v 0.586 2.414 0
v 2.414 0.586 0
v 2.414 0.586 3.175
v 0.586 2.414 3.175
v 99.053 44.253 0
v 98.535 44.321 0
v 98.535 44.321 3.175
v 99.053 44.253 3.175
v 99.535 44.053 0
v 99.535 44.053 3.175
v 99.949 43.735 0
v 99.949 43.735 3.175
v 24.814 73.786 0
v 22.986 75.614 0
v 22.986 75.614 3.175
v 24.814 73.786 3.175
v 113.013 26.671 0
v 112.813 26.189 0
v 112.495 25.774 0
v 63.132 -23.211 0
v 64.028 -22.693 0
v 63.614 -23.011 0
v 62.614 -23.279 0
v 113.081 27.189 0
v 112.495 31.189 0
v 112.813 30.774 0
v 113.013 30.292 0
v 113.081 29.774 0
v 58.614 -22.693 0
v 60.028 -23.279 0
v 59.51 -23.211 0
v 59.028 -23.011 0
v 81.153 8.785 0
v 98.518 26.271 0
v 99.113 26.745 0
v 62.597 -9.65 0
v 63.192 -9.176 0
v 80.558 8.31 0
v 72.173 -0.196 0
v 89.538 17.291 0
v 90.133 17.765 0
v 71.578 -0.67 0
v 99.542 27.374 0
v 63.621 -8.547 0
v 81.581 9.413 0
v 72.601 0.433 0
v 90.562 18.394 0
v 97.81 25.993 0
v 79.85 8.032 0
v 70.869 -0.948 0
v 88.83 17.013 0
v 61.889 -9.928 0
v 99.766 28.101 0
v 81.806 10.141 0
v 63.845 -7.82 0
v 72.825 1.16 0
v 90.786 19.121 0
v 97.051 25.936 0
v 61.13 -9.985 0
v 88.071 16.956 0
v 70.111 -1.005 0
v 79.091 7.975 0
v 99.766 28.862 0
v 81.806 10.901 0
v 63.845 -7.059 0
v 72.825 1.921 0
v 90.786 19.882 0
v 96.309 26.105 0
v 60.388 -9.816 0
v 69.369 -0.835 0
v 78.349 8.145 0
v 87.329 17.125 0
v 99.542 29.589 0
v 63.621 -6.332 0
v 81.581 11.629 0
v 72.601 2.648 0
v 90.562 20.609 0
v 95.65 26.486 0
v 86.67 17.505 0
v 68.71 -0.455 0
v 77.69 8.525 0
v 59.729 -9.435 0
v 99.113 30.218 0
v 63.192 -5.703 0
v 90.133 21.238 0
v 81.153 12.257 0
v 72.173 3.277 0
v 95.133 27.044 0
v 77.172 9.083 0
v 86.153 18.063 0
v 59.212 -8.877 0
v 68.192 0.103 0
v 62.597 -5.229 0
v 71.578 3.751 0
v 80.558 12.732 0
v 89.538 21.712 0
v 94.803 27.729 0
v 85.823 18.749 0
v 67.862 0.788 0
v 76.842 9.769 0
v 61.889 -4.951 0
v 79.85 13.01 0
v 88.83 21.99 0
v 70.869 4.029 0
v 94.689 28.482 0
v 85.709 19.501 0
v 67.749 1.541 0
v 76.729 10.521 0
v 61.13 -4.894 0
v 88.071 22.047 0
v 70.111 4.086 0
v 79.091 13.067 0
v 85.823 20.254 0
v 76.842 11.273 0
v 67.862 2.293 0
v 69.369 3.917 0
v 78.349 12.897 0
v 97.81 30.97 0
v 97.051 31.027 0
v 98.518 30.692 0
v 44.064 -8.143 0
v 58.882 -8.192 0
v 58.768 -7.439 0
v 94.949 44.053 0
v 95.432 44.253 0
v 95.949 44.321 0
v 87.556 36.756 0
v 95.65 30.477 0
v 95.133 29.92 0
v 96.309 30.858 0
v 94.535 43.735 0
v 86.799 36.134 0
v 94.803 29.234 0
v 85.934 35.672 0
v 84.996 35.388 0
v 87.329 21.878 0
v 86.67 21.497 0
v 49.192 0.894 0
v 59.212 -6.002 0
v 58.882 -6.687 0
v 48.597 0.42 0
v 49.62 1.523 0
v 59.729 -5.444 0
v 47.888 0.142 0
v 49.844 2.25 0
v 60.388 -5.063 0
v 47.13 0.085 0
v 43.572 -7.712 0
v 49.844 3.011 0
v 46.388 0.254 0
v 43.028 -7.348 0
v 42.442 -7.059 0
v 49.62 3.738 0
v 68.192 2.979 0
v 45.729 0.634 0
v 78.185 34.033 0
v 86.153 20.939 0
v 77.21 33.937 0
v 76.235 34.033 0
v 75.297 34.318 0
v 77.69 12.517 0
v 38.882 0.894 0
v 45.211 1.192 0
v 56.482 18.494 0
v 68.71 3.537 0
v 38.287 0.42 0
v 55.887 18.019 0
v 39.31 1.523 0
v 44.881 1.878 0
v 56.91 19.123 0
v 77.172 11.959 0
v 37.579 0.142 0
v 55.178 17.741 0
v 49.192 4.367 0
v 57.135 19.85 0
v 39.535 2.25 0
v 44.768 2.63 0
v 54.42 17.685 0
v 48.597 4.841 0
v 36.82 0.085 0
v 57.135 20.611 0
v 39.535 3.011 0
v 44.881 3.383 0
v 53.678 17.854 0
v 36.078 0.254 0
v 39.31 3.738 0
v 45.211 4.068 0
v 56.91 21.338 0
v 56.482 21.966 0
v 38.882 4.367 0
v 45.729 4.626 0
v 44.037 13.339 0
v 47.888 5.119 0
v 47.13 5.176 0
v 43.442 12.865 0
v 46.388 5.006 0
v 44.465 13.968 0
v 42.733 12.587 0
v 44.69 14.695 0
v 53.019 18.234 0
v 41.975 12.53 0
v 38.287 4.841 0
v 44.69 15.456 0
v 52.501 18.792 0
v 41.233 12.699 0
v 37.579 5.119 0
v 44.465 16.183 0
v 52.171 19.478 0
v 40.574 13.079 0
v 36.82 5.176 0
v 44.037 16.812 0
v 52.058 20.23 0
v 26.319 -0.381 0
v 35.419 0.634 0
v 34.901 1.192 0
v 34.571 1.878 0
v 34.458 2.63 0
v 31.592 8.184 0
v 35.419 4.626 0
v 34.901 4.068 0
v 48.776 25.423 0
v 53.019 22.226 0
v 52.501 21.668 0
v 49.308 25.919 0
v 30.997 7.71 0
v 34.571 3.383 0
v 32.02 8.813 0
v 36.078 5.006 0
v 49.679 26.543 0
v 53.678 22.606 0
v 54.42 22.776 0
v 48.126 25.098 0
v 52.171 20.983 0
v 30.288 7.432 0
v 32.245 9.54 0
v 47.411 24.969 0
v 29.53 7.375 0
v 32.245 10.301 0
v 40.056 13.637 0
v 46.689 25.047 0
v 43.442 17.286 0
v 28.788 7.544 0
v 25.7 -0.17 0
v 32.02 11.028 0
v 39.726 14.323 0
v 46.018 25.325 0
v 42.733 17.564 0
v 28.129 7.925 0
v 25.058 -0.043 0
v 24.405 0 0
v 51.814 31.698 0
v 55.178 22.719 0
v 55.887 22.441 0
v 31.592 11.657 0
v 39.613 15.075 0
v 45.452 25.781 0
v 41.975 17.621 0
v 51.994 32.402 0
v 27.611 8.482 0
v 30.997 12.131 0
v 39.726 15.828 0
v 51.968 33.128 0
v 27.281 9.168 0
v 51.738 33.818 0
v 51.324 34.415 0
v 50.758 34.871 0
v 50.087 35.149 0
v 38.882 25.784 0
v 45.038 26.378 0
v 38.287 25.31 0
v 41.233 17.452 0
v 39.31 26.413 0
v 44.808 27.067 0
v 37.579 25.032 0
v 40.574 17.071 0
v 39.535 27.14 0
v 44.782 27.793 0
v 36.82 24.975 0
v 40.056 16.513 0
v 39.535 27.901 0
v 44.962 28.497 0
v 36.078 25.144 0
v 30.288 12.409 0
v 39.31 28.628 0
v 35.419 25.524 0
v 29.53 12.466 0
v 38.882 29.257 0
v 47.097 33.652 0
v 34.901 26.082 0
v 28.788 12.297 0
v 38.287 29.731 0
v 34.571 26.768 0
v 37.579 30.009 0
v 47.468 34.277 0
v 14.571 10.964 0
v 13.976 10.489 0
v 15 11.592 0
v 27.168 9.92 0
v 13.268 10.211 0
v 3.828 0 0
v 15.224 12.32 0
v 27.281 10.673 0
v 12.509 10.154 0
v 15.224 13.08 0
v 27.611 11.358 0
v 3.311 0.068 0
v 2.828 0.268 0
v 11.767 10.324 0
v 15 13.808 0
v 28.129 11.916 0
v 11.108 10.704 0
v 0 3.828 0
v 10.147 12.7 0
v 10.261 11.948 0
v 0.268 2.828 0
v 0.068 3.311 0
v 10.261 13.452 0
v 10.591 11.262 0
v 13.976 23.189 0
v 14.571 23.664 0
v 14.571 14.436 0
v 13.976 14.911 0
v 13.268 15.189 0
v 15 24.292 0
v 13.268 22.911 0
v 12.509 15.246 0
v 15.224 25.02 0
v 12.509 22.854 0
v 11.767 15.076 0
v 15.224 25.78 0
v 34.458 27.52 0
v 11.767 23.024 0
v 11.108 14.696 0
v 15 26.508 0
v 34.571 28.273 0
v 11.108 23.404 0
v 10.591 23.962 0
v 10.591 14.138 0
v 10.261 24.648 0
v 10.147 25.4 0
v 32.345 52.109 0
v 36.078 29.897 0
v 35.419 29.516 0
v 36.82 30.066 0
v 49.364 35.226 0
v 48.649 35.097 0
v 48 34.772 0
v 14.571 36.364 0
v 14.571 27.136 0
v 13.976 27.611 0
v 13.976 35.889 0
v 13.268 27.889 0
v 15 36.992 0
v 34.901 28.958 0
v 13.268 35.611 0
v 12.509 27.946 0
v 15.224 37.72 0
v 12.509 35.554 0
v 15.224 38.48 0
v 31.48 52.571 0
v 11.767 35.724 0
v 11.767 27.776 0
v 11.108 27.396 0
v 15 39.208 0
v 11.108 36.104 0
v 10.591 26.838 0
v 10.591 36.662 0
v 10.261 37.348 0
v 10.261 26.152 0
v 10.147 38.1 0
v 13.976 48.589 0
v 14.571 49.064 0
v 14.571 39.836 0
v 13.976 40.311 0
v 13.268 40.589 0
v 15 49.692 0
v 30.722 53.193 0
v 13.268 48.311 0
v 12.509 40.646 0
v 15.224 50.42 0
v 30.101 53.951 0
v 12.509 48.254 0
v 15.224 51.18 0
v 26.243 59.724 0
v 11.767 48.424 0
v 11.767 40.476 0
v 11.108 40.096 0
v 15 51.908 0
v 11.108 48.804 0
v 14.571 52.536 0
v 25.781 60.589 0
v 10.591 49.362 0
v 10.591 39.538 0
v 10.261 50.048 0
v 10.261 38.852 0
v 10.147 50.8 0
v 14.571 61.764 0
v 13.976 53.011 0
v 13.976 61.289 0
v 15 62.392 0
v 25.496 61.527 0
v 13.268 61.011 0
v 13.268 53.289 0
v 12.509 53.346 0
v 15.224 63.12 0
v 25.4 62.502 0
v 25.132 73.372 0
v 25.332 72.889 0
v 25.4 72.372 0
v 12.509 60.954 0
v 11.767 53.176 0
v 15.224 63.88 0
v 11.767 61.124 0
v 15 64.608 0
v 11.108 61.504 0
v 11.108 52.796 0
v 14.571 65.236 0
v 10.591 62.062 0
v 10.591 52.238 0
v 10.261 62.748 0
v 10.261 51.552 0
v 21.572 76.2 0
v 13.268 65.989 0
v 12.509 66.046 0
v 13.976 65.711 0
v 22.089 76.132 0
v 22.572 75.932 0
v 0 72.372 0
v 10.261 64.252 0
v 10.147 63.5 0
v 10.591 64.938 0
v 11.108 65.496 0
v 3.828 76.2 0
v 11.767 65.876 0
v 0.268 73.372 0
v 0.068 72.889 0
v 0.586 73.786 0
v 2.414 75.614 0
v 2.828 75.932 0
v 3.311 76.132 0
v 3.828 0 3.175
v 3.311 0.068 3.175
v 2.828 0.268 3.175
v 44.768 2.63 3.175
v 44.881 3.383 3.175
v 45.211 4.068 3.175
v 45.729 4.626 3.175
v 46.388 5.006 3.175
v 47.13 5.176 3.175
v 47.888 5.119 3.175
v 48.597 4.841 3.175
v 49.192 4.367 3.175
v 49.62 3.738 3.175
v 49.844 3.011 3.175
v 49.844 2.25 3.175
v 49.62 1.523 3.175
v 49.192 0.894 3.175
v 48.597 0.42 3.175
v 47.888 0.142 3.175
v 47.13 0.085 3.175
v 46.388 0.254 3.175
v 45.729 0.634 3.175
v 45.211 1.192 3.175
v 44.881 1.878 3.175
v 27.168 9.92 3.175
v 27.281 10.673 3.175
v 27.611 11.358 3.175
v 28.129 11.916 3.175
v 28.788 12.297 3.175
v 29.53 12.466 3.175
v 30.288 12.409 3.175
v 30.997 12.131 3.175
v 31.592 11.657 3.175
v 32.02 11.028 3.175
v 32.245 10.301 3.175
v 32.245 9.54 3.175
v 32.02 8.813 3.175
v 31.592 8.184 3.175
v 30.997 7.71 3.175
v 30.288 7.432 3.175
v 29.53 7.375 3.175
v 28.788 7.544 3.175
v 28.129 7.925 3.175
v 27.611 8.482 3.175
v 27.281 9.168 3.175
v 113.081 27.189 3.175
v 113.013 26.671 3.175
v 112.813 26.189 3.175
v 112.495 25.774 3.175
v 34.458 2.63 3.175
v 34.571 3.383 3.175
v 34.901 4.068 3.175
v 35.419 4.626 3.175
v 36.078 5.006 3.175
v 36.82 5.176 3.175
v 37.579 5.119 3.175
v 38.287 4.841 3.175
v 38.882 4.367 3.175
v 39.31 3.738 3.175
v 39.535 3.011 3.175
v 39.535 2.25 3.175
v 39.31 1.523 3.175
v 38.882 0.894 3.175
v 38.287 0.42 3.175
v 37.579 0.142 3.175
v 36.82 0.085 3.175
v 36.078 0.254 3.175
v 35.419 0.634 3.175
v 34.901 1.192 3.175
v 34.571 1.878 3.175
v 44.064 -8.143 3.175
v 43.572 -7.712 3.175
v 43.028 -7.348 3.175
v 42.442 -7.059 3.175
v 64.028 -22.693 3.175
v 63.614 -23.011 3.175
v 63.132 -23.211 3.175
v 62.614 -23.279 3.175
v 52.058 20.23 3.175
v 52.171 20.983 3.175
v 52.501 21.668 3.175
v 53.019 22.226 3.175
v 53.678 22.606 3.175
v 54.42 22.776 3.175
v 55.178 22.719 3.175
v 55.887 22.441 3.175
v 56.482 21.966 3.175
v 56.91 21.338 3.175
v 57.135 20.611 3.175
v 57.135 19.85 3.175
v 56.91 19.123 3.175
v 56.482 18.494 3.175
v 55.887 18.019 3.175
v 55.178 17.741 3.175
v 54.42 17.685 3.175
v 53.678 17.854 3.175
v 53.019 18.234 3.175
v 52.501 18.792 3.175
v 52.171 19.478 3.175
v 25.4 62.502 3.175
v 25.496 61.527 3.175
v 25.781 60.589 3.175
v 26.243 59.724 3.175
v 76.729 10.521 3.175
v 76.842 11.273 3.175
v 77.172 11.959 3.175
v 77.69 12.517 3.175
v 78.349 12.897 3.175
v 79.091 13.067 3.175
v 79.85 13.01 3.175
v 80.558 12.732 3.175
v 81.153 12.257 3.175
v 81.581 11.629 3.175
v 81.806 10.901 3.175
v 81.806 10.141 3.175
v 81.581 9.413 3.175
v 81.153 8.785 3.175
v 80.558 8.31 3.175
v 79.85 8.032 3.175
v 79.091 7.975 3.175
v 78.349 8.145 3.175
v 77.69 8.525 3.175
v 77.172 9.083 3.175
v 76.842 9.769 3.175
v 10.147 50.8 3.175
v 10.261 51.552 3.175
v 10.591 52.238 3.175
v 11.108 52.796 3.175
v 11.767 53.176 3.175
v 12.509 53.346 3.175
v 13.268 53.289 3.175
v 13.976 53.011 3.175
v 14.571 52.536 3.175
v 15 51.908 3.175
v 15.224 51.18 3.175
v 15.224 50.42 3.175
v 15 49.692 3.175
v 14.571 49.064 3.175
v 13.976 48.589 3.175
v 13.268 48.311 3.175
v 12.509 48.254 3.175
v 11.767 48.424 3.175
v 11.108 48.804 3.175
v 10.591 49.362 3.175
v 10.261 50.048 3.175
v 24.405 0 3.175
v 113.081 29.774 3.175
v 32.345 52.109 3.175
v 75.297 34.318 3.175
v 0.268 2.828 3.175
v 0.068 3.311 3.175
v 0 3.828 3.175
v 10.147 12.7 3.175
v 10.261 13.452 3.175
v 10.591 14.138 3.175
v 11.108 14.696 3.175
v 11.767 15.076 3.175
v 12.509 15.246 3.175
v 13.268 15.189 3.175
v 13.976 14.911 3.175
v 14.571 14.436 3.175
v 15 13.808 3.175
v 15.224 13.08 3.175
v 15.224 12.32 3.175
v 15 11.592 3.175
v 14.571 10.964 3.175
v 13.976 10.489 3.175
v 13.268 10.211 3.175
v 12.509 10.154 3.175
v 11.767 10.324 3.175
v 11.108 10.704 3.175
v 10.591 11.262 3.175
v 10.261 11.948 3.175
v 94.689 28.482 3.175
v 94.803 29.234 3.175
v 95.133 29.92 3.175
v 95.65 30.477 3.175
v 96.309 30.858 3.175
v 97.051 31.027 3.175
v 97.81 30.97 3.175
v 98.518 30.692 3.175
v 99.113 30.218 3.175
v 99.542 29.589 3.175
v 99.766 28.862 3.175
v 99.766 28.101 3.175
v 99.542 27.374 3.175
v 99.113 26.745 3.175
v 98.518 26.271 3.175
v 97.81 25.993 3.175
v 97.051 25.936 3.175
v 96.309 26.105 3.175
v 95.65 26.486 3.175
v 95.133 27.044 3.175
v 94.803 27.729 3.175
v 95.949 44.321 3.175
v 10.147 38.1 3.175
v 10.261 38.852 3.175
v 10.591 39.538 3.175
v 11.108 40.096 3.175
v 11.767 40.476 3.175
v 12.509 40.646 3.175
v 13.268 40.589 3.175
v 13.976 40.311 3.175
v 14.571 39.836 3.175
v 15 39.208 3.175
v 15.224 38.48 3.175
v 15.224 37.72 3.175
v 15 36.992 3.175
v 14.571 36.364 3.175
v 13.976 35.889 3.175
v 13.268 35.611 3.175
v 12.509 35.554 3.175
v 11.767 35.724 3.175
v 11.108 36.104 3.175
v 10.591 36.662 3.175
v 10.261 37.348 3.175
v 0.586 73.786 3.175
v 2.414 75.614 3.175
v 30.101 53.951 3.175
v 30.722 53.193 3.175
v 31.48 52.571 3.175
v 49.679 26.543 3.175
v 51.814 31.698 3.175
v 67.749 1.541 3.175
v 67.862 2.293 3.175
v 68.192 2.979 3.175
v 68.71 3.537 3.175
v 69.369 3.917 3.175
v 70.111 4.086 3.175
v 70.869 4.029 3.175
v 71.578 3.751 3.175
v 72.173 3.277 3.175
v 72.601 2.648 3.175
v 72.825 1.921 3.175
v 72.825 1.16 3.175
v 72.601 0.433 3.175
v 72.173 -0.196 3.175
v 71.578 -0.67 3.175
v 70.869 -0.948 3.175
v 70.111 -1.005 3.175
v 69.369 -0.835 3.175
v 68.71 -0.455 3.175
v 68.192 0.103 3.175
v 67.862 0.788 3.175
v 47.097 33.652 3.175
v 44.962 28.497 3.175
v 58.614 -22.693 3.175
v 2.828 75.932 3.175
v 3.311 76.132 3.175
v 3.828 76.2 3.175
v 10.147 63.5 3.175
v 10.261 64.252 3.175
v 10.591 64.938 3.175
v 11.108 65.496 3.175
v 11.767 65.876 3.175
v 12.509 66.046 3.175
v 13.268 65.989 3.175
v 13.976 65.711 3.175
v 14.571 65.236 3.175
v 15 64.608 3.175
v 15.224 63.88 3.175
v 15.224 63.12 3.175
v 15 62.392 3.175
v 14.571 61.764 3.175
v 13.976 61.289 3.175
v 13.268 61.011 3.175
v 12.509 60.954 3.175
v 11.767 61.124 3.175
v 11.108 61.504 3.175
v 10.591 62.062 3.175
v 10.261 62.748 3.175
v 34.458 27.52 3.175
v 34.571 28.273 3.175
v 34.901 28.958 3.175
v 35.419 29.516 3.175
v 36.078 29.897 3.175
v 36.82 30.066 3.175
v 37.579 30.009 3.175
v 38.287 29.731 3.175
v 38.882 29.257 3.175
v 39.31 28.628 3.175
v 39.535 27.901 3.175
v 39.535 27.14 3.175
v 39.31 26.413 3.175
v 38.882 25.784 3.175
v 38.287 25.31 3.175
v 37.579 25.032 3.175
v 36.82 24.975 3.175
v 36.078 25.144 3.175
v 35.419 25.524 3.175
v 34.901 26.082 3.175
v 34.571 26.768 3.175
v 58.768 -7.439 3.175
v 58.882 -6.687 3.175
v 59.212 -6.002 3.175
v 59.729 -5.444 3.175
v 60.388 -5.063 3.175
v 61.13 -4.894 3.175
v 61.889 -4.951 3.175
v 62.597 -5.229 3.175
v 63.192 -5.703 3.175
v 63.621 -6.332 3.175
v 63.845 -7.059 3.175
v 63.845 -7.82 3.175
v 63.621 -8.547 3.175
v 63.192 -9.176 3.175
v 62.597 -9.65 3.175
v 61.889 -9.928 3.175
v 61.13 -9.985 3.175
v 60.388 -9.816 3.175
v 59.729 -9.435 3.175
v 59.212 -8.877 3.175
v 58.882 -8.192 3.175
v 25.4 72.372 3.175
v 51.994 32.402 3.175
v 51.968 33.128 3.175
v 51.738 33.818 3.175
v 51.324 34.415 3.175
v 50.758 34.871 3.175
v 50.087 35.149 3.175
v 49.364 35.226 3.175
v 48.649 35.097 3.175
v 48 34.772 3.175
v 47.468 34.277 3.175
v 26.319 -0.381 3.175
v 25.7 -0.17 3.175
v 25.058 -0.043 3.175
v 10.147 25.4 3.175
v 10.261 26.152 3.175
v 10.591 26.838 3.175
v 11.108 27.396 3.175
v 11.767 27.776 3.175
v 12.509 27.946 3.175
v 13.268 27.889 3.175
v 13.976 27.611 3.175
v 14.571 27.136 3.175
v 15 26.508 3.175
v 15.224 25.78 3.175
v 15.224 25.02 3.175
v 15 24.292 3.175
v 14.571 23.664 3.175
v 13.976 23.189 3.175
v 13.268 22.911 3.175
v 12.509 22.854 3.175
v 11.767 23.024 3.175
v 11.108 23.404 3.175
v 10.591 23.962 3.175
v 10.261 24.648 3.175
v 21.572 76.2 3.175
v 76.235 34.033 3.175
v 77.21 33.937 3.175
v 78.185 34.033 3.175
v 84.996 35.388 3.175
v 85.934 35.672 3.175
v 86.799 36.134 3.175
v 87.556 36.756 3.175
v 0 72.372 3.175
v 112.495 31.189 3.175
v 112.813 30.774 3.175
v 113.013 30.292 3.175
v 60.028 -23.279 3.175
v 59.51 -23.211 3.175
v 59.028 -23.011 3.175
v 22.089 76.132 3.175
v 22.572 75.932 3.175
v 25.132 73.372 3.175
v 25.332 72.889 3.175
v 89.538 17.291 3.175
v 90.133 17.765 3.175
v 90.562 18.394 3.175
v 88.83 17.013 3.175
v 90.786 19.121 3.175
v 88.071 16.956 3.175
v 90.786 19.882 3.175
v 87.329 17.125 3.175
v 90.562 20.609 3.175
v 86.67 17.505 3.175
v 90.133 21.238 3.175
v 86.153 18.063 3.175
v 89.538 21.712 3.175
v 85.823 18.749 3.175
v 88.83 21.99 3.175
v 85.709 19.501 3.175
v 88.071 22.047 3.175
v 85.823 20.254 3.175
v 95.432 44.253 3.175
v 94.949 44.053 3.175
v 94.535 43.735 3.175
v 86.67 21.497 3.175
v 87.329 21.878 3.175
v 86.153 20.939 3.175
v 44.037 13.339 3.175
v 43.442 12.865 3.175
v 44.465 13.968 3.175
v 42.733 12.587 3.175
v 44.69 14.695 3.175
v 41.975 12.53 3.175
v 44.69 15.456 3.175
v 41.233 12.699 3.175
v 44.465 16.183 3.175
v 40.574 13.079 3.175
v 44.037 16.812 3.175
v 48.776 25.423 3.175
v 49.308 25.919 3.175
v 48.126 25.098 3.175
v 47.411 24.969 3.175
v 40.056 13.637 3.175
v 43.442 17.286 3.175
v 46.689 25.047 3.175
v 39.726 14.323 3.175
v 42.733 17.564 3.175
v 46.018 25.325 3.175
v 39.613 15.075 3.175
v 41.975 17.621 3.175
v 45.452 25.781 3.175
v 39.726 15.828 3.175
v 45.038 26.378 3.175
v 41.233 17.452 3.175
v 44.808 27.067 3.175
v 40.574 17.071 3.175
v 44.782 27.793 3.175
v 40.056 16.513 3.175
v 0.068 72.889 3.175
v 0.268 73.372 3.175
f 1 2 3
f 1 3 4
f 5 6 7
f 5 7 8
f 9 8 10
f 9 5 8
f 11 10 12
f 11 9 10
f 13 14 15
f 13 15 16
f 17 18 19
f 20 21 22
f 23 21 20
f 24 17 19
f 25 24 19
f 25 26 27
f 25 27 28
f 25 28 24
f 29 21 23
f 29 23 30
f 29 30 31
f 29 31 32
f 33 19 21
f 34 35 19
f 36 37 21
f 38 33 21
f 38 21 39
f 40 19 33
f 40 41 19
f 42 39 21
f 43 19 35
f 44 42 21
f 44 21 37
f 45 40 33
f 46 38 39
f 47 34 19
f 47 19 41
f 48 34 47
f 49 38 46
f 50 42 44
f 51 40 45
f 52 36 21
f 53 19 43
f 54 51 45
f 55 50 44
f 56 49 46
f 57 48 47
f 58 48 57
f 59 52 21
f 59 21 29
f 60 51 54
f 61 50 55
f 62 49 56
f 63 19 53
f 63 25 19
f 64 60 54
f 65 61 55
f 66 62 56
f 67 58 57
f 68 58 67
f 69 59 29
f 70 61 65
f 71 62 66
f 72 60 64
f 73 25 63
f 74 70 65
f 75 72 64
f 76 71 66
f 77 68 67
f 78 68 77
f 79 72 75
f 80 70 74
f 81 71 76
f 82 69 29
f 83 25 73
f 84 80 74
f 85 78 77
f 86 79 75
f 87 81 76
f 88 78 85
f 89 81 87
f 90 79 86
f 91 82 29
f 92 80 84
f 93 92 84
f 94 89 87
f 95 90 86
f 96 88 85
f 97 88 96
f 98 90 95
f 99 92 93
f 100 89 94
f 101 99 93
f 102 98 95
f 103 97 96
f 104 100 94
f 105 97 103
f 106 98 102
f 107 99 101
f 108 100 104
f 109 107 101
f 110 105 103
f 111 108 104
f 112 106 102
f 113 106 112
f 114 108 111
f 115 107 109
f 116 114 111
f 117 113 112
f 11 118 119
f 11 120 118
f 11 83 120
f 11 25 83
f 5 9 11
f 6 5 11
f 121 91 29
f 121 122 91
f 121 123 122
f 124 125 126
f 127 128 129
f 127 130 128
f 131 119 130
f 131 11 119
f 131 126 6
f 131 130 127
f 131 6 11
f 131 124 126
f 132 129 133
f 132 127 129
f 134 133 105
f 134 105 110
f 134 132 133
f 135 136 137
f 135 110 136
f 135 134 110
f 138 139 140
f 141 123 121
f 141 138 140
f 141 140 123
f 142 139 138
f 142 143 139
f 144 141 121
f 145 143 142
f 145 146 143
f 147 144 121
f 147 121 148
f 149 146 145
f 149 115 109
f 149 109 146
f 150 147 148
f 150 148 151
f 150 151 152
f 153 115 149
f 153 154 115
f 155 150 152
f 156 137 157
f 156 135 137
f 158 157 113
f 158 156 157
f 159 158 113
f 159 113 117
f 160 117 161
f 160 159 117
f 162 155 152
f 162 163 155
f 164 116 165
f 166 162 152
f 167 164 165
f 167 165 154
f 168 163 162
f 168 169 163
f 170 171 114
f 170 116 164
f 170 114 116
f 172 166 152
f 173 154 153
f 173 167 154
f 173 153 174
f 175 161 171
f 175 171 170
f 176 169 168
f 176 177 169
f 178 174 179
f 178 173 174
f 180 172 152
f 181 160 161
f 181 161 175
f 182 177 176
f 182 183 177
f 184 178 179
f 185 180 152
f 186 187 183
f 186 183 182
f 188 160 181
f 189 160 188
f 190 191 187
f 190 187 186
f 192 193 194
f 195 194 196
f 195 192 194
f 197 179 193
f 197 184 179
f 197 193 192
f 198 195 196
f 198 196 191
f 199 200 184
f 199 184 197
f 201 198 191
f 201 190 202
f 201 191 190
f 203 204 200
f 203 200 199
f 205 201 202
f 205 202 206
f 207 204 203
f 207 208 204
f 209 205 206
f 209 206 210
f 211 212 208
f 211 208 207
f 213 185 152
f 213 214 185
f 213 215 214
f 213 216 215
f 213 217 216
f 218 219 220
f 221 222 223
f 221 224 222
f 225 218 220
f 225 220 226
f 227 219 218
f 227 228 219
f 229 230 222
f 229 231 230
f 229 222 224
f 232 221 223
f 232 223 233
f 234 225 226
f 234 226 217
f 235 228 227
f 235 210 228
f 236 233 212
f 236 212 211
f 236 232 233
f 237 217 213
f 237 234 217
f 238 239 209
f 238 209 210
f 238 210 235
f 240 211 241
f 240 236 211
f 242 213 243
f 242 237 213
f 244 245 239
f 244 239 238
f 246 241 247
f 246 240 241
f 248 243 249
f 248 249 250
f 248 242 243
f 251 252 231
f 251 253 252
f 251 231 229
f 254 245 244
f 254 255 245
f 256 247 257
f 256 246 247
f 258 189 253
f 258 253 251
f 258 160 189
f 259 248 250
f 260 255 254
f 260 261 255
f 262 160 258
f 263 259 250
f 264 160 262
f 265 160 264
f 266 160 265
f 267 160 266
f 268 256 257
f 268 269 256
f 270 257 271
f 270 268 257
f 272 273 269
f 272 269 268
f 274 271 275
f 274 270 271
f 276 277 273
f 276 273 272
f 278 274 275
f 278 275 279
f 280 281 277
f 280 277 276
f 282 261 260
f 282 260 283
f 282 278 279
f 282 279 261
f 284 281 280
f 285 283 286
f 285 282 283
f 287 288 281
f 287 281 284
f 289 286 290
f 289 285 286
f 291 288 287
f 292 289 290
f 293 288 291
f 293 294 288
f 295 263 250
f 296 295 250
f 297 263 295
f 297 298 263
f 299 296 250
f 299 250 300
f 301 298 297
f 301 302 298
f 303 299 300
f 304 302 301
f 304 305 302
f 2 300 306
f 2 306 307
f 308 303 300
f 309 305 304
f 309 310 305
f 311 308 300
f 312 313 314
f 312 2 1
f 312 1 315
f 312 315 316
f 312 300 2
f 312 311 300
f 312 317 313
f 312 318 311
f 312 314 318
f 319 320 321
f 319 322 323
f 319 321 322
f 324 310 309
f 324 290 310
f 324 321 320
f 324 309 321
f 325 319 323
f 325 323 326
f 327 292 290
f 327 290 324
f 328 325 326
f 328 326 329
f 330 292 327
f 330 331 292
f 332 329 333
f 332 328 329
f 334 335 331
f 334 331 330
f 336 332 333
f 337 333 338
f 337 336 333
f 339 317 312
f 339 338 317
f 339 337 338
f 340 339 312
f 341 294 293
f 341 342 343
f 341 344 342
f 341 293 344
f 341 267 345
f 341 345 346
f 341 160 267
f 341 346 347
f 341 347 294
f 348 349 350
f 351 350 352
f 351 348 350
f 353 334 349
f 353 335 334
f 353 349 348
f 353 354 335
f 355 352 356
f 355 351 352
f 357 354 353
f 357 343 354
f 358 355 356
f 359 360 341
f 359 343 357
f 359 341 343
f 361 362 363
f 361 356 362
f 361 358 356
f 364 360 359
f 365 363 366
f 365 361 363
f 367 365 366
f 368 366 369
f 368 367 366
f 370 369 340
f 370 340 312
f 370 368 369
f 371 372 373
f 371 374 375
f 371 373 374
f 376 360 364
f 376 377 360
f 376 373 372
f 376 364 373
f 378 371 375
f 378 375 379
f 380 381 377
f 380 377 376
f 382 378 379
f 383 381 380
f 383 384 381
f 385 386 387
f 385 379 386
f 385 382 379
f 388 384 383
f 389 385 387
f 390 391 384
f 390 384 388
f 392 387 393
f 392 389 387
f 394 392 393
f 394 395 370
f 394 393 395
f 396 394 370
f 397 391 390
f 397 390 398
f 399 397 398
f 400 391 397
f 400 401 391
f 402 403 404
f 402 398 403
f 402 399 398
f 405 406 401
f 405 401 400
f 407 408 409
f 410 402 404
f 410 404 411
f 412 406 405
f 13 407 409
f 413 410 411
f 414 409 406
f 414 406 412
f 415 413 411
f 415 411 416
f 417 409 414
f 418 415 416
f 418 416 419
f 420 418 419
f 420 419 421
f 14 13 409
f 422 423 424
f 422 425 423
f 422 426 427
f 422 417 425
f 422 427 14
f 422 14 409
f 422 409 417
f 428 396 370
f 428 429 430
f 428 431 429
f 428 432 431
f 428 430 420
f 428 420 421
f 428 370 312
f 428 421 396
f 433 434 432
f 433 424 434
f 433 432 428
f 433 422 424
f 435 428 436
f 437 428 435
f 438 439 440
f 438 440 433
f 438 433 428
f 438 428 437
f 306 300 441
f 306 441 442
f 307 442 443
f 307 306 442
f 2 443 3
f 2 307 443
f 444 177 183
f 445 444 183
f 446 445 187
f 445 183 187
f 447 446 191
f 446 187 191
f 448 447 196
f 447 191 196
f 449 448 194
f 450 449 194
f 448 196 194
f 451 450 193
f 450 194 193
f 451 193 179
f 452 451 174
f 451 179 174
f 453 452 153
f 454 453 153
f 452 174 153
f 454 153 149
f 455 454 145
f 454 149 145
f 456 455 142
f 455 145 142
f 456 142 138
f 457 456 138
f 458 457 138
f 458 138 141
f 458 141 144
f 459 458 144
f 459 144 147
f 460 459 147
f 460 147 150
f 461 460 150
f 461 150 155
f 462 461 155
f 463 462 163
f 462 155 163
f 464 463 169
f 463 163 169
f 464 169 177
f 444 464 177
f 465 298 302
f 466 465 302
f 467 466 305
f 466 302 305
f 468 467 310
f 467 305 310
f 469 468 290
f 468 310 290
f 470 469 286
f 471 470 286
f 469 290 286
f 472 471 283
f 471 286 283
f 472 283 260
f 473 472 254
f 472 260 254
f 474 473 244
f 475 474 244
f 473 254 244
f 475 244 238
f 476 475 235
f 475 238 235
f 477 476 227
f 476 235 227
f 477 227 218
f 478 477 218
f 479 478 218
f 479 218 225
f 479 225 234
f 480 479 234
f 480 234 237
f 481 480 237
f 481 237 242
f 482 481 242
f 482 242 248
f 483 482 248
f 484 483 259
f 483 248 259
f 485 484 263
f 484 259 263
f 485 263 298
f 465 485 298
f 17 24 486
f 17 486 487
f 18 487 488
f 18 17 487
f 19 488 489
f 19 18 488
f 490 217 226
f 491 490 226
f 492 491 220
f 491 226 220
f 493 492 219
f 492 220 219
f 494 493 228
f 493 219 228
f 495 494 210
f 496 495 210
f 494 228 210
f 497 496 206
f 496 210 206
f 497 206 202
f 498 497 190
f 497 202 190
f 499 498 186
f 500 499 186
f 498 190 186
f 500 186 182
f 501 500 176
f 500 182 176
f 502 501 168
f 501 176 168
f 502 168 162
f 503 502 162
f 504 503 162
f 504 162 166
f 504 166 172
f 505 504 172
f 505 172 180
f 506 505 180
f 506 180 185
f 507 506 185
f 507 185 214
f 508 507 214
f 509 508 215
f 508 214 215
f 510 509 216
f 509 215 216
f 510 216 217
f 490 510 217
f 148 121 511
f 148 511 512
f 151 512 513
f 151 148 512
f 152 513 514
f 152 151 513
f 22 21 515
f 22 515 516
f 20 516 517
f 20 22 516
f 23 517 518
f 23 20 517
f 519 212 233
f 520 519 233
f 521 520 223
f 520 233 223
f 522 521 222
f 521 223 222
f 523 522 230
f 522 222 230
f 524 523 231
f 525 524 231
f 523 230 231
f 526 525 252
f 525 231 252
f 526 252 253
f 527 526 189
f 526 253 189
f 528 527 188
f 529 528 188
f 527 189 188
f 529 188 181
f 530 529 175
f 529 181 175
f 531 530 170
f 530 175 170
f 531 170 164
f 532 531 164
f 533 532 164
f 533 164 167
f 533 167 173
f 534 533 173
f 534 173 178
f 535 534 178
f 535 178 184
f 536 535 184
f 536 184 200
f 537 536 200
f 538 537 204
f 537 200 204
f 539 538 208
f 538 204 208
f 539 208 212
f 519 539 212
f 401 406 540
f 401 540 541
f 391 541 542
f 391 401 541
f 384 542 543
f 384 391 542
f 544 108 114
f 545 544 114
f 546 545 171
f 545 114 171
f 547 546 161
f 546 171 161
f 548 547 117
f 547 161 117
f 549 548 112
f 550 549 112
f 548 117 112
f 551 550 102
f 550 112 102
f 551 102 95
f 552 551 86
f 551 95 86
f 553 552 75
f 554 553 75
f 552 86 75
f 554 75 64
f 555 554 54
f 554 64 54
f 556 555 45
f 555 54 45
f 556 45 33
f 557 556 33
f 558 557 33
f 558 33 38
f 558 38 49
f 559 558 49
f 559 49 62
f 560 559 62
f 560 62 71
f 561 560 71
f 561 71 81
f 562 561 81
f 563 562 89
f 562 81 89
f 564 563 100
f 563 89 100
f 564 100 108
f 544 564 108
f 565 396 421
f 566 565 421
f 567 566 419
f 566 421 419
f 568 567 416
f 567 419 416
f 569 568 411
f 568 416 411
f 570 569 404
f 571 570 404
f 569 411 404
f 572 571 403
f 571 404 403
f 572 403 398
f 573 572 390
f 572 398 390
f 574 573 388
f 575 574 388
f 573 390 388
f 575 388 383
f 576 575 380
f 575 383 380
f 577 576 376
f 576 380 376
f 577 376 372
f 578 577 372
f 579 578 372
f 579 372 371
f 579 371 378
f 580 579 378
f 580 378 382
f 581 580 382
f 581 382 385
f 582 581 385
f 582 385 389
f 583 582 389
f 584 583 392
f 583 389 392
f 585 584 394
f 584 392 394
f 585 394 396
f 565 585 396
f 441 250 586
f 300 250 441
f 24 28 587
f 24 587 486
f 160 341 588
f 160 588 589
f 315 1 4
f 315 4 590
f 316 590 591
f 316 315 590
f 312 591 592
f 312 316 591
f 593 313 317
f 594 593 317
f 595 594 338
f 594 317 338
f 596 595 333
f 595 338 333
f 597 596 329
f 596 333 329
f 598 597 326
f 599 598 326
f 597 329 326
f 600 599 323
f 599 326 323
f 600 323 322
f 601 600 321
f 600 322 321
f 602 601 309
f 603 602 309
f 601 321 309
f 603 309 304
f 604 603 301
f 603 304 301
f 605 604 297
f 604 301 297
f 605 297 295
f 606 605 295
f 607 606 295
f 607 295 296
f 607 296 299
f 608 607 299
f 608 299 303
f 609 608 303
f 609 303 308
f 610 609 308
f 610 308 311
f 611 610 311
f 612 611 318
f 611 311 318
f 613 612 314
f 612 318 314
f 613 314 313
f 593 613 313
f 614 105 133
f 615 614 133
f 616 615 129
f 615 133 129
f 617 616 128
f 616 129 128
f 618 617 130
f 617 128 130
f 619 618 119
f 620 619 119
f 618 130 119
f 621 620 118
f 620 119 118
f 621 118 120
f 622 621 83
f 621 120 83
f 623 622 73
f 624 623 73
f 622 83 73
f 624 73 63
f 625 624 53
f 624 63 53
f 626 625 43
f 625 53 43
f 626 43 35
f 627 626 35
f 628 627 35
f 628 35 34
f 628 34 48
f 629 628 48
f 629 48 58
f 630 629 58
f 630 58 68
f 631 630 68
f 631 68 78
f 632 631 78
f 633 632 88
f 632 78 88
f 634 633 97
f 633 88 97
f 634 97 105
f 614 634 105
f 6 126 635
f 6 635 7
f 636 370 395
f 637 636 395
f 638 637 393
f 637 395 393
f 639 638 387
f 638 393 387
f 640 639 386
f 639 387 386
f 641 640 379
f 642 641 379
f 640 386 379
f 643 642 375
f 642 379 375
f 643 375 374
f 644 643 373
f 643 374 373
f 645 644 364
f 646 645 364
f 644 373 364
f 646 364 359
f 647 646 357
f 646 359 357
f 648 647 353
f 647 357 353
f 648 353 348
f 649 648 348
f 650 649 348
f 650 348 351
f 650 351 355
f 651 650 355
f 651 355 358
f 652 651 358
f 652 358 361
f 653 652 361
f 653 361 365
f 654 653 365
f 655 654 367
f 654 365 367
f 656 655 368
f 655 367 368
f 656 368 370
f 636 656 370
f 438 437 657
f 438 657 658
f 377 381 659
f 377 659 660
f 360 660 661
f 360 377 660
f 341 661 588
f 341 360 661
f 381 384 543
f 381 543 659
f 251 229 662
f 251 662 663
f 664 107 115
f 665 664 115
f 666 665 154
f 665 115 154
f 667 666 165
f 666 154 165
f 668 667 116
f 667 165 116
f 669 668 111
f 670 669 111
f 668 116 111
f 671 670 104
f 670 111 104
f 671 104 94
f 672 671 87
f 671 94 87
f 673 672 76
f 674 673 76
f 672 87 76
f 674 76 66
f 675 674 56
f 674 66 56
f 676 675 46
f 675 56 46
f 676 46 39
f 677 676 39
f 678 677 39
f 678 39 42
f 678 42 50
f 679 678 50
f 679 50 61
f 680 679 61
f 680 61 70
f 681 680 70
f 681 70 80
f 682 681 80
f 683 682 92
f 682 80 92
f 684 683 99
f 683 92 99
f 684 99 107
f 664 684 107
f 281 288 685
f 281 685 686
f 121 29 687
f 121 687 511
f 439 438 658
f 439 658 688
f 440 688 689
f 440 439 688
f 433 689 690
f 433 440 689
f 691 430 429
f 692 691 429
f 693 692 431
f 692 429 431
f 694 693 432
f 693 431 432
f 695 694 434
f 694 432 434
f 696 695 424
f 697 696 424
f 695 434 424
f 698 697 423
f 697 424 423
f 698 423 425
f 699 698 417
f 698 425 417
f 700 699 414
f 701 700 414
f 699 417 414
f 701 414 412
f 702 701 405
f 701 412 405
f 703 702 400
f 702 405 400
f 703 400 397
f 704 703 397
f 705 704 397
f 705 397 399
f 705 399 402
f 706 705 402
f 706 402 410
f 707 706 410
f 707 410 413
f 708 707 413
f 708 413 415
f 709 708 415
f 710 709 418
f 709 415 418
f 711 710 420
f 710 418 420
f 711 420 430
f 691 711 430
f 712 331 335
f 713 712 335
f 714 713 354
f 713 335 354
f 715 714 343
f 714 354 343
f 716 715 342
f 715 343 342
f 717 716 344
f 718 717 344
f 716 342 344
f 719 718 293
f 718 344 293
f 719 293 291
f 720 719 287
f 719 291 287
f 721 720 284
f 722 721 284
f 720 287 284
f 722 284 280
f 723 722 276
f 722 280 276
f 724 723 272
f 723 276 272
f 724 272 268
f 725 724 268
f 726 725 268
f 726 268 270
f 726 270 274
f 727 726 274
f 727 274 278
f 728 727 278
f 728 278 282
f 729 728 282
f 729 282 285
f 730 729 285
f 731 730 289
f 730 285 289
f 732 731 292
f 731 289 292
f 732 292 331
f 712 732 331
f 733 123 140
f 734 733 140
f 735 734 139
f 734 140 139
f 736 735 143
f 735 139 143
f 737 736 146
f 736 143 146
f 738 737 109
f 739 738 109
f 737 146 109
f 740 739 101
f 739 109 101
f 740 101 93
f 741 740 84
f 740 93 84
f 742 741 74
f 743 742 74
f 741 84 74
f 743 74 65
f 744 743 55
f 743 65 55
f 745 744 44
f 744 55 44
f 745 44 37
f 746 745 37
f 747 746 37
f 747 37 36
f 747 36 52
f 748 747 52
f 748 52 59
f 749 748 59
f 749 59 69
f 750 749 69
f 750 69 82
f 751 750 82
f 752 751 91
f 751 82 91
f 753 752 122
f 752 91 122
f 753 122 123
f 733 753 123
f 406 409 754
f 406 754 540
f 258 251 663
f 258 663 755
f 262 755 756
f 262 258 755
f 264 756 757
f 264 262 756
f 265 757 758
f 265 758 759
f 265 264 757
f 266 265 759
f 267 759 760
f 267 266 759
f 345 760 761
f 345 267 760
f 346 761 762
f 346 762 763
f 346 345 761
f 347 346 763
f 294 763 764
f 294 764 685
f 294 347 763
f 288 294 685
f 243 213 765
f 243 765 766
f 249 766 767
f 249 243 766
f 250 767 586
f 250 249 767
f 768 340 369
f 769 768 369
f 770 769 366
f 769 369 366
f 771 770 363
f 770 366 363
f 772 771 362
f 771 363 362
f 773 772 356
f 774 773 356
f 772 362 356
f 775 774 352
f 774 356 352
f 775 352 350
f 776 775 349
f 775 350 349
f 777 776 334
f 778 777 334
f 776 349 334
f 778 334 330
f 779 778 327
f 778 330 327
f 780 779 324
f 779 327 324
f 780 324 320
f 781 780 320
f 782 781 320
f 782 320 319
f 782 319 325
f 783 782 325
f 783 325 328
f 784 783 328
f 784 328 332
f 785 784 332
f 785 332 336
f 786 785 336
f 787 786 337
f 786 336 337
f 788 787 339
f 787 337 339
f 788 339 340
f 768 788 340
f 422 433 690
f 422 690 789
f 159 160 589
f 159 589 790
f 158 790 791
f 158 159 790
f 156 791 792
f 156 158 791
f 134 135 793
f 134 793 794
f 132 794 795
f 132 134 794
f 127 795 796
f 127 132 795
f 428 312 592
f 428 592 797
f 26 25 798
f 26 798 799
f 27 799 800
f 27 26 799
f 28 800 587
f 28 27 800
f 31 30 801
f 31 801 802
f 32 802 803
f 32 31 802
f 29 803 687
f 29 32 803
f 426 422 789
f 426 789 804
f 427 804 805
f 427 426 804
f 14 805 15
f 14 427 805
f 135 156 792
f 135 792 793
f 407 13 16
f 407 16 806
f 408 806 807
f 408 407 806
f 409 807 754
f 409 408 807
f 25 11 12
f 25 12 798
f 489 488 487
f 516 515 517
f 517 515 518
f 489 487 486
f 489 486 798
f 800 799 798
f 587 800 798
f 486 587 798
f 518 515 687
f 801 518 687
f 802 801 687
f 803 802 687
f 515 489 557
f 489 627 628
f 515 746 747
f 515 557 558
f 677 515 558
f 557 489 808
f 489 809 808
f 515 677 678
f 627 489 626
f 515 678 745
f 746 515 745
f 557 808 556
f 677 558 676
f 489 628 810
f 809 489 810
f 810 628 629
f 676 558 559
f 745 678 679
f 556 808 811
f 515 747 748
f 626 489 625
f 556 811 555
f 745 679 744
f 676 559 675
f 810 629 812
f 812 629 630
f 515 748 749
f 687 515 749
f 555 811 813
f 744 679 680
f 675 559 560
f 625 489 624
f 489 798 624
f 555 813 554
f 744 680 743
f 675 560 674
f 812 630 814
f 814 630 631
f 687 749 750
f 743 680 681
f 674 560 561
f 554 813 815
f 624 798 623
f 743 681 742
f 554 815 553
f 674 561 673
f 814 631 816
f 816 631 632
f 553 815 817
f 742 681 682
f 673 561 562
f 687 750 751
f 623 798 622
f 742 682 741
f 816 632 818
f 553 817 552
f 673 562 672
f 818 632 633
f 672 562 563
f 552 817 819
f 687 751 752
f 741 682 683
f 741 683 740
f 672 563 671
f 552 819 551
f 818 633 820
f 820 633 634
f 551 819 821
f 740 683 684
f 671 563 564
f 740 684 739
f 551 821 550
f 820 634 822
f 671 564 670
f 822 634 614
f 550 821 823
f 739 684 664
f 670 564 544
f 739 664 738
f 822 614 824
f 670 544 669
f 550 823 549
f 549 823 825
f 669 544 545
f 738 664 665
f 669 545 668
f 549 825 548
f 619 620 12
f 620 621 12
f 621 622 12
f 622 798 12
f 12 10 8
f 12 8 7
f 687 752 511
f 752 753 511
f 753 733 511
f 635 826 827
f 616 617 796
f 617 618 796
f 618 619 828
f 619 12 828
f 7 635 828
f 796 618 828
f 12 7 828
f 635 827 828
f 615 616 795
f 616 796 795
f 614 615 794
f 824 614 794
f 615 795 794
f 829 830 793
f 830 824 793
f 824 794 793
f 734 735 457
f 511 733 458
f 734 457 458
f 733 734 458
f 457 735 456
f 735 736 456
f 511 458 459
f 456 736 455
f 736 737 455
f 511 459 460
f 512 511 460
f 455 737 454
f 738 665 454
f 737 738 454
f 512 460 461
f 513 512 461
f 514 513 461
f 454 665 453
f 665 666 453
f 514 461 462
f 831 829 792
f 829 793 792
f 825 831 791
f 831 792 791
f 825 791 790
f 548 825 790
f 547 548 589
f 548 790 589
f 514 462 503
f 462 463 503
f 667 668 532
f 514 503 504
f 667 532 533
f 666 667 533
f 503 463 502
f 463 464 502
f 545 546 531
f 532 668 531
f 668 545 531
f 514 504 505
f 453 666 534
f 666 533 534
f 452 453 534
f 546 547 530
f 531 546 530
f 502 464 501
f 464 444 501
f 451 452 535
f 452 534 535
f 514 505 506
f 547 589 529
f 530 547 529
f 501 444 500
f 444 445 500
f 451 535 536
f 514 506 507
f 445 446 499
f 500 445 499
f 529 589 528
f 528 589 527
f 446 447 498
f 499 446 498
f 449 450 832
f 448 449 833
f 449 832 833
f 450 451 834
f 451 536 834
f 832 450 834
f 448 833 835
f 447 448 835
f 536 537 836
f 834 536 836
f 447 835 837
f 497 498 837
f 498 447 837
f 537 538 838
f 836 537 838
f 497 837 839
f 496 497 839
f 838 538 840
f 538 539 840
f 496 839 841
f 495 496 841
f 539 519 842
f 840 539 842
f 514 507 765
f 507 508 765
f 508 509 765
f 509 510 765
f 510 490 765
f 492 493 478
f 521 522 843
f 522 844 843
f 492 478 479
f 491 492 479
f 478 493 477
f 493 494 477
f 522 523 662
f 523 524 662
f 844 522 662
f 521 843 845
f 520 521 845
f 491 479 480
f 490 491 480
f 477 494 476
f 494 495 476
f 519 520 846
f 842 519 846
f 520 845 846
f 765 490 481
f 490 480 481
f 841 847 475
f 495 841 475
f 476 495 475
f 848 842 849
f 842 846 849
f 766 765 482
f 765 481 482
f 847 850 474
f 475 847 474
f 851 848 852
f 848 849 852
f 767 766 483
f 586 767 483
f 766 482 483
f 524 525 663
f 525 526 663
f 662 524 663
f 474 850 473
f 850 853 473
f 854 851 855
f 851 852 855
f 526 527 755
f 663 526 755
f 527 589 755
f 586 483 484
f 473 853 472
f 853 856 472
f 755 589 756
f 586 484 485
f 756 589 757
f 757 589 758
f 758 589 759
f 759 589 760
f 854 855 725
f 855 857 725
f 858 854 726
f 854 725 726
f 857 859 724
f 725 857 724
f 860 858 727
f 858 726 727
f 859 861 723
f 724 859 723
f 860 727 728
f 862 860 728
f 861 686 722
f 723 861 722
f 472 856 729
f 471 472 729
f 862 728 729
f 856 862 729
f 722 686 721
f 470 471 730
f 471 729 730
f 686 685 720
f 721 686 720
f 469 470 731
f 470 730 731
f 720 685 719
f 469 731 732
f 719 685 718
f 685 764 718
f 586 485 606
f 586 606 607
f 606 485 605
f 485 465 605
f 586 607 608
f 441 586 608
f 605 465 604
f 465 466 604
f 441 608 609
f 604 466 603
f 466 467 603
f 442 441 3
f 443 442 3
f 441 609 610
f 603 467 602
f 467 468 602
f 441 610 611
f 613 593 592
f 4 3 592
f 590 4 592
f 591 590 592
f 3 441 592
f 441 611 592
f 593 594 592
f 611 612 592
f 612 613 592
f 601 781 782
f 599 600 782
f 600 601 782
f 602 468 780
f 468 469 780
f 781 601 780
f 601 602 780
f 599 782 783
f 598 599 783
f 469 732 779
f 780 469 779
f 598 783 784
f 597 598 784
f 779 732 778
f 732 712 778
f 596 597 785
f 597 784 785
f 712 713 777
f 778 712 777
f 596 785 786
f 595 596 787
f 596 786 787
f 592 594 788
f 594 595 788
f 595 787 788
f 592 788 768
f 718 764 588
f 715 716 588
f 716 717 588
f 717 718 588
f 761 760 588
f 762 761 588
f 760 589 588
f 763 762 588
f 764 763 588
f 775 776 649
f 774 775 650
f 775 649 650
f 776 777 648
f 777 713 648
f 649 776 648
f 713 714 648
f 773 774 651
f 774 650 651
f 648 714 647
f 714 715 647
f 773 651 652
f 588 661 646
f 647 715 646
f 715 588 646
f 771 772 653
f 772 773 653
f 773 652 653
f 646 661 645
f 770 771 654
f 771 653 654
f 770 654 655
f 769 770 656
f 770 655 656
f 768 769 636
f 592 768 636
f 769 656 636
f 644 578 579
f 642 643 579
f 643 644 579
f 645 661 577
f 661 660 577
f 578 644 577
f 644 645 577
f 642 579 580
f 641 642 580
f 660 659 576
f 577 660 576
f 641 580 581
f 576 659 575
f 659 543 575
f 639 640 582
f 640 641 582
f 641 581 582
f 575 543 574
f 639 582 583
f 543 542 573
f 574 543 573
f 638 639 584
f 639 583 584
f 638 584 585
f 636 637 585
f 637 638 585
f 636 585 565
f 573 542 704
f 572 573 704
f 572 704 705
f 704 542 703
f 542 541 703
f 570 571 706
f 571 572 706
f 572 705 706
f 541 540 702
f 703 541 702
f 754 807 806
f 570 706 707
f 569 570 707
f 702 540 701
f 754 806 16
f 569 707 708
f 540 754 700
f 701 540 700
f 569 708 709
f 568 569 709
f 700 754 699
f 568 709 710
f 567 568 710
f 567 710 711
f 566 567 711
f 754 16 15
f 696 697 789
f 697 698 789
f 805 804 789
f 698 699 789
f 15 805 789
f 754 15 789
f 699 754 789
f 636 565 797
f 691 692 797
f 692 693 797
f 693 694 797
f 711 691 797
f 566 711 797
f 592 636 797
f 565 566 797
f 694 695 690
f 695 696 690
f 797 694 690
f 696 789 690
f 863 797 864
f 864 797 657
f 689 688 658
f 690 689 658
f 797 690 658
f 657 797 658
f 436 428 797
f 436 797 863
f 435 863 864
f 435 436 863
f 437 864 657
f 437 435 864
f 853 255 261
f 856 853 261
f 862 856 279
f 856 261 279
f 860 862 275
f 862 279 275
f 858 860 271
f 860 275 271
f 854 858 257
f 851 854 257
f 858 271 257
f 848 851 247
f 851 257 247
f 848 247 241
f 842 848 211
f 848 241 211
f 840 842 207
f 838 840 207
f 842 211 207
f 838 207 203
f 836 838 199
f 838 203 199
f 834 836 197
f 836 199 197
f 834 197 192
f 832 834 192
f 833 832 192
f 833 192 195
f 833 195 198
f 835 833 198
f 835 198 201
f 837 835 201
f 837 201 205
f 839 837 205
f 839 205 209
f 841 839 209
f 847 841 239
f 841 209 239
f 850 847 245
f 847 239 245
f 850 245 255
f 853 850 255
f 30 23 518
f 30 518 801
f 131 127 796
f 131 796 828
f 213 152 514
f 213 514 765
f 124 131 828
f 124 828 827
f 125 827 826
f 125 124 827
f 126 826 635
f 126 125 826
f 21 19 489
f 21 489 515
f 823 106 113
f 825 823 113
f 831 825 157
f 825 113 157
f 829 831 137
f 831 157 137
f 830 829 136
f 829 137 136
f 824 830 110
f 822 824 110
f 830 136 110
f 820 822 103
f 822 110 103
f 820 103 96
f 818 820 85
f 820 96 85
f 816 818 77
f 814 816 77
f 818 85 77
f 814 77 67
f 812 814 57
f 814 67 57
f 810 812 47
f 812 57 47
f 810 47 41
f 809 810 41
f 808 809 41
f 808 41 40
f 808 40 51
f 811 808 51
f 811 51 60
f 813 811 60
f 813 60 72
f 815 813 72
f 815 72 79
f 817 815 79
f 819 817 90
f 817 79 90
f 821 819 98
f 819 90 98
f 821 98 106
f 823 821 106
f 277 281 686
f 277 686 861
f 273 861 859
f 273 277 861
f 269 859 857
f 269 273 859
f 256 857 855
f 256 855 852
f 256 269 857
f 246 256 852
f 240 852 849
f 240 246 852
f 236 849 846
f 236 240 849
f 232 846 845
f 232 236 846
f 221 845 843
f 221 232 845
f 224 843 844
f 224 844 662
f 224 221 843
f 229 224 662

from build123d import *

# Parameters (mm, degrees)
SKETCH1_R           = 2.5527
BOSS_EXTRUDE1_DEPTH = 3.175


with BuildPart() as part:
    # Sketch1 → Boss-Extrude1 (new body)
    with BuildSketch(Plane(origin=(0, 0, 0), x_dir=(-1, 0, 0), z_dir=(0, 0, -1))):
        with BuildLine():
            Line((-2.414213562, 0.585786438), (-0.585786438, 2.414213562))
            ThreePointArc((-0.585786438, 2.414213562), (-0.152240935, 3.06306026), (0, 3.828427125))
            Line((0, 3.828427125), (0, 72.371572875))
            ThreePointArc((0, 72.371572875), (-0.152240935, 73.13693974), (-0.585786438, 73.785786438))
            Line((-0.585786438, 73.785786438), (-2.414213562, 75.614213562))
            ThreePointArc((-2.414213562, 75.614213562), (-3.06306026, 76.047759065), (-3.828427125, 76.2))
            Line((-3.828427125, 76.2), (-21.571572875, 76.2))
            ThreePointArc((-21.571572875, 76.2), (-22.33693974, 76.047759065), (-22.985786438, 75.614213562))
            Line((-22.985786438, 75.614213562), (-24.814213562, 73.785786438))
            ThreePointArc((-24.814213562, 73.785786438), (-25.247759065, 73.13693974), (-25.4, 72.371572875))
            Line((-25.4, 72.371572875), (-25.4, 62.502257193))
            ThreePointArc((-25.4, 62.502257193), (-25.615298321, 61.050833807), (-26.242651938, 59.724406028))
            Line((-26.242651938, 59.724406028), (-30.100625257, 53.950540928))
            ThreePointArc((-30.100625257, 53.950540928), (-31.086006897, 52.863339826), (-32.344556156, 52.10899443))
            Line((-32.344556156, 52.10899443), (-75.296592814, 34.317678315))
            ThreePointArc((-75.296592814, 34.317678315), (-76.719924274, 33.961152344), (-78.185461586, 34.033149576))
            Line((-78.185461586, 34.033149576), (-84.996199847, 35.387889647))
            ThreePointArc((-84.996199847, 35.387889647), (-86.377731921, 35.882209727), (-87.556282143, 36.756282143))
            Line((-87.556282143, 36.756282143), (-94.534942187, 43.734942187))
            ThreePointArc((-94.534942187, 43.734942187), (-95.183788885, 44.16848769), (-95.94915575, 44.320728625))
            Line((-95.94915575, 44.320728625), (-98.534942187, 44.320728625))
            ThreePointArc((-98.534942187, 44.320728625), (-99.300309052, 44.16848769), (-99.94915575, 43.734942187))
            Line((-99.94915575, 43.734942187), (-112.49545443, 31.188643508))
            ThreePointArc((-112.49545443, 31.188643508), (-112.928999932, 30.53979681), (-113.081240867, 29.774429945))
            Line((-113.081240867, 29.774429945), (-113.081240867, 27.188643508))
            ThreePointArc((-113.081240867, 27.188643508), (-112.928999932, 26.423276643), (-112.49545443, 25.774429945))
            Line((-112.49545443, 25.774429945), (-64.028131265, -22.692893219))
            ThreePointArc((-64.028131265, -22.692893219), (-63.379284568, -23.126438721), (-62.613917703, -23.278679656))
            Line((-62.613917703, -23.278679656), (-60.028131265, -23.278679656))
            ThreePointArc((-60.028131265, -23.278679656), (-59.262764401, -23.126438721), (-58.613917703, -22.692893219))
            Line((-58.613917703, -22.692893219), (-44.063773661, -8.142749177))
            ThreePointArc((-44.063773661, -8.142749177), (-43.30609092, -7.520935021), (-42.441656917, -7.05888542))
            Line((-42.441656917, -7.05888542), (-26.318855325, -0.380602337))
            ThreePointArc((-26.318855325, -0.380602337), (-25.380889773, -0.096073598), (-24.405438163, 0))
            Line((-24.405438163, 0), (-3.828427125, 0))
            ThreePointArc((-3.828427125, 0), (-3.06306026, 0.152240935), (-2.414213562, 0.585786438))
        make_face()
        with Locations((-29.720392856, 9.920375508)):
            Circle(SKETCH1_R, mode=Mode.SUBTRACT)
        with Locations((-47.32029795, 2.630256121)):
            Circle(SKETCH1_R, mode=Mode.SUBTRACT)
        with Locations((-12.7, 12.7)):
            Circle(SKETCH1_R, mode=Mode.SUBTRACT)
        with Locations((-12.7, 38.1)):
            Circle(SKETCH1_R, mode=Mode.SUBTRACT)
        with Locations((-12.7, 63.5)):
            Circle(SKETCH1_R, mode=Mode.SUBTRACT)
        with Locations((-12.7, 25.4)):
            Circle(SKETCH1_R, mode=Mode.SUBTRACT)
        with Locations((-12.7, 50.8)):
            Circle(SKETCH1_R, mode=Mode.SUBTRACT)
        with Locations((-70.301280605, 1.540768363)):
            Circle(SKETCH1_R, mode=Mode.SUBTRACT)
        with Locations((-88.261792847, 19.501280605)):
            Circle(SKETCH1_R, mode=Mode.SUBTRACT)
        with Locations((-97.242048969, 28.481536726)):
            Circle(SKETCH1_R, mode=Mode.SUBTRACT)
        with Locations((-79.281536726, 10.521024484)):
            Circle(SKETCH1_R, mode=Mode.SUBTRACT)
        with Locations((-61.321024484, -7.439487758)):
            Circle(SKETCH1_R, mode=Mode.SUBTRACT)
        with Locations((-37.010512242, 27.520280602)):
            Circle(SKETCH1_R, mode=Mode.SUBTRACT)
        with Locations((-54.610417336, 20.230161215)):
            Circle(SKETCH1_R, mode=Mode.SUBTRACT)
        with Locations((-42.165405096, 15.075268362)):
            Circle(SKETCH1_R, mode=Mode.SUBTRACT)
        with Locations((-37.010512242, 2.630256121)):
            Circle(SKETCH1_R, mode=Mode.SUBTRACT)
        with BuildLine():
            Line((-49.678685233, 26.543404604), (-51.813911765, 31.698297458))
            ThreePointArc((-51.813911765, 31.698297458), (-50.43240048, 35.033560738), (-47.0971372, 33.652049454))
            Line((-47.0971372, 33.652049454), (-44.961910667, 28.4971566))
            ThreePointArc((-44.961910667, 28.4971566), (-46.343421952, 25.161893319), (-49.678685233, 26.543404604))
        make_face(mode=Mode.SUBTRACT)
    extrude(amount=-BOSS_EXTRUDE1_DEPTH)


solid = part.part
